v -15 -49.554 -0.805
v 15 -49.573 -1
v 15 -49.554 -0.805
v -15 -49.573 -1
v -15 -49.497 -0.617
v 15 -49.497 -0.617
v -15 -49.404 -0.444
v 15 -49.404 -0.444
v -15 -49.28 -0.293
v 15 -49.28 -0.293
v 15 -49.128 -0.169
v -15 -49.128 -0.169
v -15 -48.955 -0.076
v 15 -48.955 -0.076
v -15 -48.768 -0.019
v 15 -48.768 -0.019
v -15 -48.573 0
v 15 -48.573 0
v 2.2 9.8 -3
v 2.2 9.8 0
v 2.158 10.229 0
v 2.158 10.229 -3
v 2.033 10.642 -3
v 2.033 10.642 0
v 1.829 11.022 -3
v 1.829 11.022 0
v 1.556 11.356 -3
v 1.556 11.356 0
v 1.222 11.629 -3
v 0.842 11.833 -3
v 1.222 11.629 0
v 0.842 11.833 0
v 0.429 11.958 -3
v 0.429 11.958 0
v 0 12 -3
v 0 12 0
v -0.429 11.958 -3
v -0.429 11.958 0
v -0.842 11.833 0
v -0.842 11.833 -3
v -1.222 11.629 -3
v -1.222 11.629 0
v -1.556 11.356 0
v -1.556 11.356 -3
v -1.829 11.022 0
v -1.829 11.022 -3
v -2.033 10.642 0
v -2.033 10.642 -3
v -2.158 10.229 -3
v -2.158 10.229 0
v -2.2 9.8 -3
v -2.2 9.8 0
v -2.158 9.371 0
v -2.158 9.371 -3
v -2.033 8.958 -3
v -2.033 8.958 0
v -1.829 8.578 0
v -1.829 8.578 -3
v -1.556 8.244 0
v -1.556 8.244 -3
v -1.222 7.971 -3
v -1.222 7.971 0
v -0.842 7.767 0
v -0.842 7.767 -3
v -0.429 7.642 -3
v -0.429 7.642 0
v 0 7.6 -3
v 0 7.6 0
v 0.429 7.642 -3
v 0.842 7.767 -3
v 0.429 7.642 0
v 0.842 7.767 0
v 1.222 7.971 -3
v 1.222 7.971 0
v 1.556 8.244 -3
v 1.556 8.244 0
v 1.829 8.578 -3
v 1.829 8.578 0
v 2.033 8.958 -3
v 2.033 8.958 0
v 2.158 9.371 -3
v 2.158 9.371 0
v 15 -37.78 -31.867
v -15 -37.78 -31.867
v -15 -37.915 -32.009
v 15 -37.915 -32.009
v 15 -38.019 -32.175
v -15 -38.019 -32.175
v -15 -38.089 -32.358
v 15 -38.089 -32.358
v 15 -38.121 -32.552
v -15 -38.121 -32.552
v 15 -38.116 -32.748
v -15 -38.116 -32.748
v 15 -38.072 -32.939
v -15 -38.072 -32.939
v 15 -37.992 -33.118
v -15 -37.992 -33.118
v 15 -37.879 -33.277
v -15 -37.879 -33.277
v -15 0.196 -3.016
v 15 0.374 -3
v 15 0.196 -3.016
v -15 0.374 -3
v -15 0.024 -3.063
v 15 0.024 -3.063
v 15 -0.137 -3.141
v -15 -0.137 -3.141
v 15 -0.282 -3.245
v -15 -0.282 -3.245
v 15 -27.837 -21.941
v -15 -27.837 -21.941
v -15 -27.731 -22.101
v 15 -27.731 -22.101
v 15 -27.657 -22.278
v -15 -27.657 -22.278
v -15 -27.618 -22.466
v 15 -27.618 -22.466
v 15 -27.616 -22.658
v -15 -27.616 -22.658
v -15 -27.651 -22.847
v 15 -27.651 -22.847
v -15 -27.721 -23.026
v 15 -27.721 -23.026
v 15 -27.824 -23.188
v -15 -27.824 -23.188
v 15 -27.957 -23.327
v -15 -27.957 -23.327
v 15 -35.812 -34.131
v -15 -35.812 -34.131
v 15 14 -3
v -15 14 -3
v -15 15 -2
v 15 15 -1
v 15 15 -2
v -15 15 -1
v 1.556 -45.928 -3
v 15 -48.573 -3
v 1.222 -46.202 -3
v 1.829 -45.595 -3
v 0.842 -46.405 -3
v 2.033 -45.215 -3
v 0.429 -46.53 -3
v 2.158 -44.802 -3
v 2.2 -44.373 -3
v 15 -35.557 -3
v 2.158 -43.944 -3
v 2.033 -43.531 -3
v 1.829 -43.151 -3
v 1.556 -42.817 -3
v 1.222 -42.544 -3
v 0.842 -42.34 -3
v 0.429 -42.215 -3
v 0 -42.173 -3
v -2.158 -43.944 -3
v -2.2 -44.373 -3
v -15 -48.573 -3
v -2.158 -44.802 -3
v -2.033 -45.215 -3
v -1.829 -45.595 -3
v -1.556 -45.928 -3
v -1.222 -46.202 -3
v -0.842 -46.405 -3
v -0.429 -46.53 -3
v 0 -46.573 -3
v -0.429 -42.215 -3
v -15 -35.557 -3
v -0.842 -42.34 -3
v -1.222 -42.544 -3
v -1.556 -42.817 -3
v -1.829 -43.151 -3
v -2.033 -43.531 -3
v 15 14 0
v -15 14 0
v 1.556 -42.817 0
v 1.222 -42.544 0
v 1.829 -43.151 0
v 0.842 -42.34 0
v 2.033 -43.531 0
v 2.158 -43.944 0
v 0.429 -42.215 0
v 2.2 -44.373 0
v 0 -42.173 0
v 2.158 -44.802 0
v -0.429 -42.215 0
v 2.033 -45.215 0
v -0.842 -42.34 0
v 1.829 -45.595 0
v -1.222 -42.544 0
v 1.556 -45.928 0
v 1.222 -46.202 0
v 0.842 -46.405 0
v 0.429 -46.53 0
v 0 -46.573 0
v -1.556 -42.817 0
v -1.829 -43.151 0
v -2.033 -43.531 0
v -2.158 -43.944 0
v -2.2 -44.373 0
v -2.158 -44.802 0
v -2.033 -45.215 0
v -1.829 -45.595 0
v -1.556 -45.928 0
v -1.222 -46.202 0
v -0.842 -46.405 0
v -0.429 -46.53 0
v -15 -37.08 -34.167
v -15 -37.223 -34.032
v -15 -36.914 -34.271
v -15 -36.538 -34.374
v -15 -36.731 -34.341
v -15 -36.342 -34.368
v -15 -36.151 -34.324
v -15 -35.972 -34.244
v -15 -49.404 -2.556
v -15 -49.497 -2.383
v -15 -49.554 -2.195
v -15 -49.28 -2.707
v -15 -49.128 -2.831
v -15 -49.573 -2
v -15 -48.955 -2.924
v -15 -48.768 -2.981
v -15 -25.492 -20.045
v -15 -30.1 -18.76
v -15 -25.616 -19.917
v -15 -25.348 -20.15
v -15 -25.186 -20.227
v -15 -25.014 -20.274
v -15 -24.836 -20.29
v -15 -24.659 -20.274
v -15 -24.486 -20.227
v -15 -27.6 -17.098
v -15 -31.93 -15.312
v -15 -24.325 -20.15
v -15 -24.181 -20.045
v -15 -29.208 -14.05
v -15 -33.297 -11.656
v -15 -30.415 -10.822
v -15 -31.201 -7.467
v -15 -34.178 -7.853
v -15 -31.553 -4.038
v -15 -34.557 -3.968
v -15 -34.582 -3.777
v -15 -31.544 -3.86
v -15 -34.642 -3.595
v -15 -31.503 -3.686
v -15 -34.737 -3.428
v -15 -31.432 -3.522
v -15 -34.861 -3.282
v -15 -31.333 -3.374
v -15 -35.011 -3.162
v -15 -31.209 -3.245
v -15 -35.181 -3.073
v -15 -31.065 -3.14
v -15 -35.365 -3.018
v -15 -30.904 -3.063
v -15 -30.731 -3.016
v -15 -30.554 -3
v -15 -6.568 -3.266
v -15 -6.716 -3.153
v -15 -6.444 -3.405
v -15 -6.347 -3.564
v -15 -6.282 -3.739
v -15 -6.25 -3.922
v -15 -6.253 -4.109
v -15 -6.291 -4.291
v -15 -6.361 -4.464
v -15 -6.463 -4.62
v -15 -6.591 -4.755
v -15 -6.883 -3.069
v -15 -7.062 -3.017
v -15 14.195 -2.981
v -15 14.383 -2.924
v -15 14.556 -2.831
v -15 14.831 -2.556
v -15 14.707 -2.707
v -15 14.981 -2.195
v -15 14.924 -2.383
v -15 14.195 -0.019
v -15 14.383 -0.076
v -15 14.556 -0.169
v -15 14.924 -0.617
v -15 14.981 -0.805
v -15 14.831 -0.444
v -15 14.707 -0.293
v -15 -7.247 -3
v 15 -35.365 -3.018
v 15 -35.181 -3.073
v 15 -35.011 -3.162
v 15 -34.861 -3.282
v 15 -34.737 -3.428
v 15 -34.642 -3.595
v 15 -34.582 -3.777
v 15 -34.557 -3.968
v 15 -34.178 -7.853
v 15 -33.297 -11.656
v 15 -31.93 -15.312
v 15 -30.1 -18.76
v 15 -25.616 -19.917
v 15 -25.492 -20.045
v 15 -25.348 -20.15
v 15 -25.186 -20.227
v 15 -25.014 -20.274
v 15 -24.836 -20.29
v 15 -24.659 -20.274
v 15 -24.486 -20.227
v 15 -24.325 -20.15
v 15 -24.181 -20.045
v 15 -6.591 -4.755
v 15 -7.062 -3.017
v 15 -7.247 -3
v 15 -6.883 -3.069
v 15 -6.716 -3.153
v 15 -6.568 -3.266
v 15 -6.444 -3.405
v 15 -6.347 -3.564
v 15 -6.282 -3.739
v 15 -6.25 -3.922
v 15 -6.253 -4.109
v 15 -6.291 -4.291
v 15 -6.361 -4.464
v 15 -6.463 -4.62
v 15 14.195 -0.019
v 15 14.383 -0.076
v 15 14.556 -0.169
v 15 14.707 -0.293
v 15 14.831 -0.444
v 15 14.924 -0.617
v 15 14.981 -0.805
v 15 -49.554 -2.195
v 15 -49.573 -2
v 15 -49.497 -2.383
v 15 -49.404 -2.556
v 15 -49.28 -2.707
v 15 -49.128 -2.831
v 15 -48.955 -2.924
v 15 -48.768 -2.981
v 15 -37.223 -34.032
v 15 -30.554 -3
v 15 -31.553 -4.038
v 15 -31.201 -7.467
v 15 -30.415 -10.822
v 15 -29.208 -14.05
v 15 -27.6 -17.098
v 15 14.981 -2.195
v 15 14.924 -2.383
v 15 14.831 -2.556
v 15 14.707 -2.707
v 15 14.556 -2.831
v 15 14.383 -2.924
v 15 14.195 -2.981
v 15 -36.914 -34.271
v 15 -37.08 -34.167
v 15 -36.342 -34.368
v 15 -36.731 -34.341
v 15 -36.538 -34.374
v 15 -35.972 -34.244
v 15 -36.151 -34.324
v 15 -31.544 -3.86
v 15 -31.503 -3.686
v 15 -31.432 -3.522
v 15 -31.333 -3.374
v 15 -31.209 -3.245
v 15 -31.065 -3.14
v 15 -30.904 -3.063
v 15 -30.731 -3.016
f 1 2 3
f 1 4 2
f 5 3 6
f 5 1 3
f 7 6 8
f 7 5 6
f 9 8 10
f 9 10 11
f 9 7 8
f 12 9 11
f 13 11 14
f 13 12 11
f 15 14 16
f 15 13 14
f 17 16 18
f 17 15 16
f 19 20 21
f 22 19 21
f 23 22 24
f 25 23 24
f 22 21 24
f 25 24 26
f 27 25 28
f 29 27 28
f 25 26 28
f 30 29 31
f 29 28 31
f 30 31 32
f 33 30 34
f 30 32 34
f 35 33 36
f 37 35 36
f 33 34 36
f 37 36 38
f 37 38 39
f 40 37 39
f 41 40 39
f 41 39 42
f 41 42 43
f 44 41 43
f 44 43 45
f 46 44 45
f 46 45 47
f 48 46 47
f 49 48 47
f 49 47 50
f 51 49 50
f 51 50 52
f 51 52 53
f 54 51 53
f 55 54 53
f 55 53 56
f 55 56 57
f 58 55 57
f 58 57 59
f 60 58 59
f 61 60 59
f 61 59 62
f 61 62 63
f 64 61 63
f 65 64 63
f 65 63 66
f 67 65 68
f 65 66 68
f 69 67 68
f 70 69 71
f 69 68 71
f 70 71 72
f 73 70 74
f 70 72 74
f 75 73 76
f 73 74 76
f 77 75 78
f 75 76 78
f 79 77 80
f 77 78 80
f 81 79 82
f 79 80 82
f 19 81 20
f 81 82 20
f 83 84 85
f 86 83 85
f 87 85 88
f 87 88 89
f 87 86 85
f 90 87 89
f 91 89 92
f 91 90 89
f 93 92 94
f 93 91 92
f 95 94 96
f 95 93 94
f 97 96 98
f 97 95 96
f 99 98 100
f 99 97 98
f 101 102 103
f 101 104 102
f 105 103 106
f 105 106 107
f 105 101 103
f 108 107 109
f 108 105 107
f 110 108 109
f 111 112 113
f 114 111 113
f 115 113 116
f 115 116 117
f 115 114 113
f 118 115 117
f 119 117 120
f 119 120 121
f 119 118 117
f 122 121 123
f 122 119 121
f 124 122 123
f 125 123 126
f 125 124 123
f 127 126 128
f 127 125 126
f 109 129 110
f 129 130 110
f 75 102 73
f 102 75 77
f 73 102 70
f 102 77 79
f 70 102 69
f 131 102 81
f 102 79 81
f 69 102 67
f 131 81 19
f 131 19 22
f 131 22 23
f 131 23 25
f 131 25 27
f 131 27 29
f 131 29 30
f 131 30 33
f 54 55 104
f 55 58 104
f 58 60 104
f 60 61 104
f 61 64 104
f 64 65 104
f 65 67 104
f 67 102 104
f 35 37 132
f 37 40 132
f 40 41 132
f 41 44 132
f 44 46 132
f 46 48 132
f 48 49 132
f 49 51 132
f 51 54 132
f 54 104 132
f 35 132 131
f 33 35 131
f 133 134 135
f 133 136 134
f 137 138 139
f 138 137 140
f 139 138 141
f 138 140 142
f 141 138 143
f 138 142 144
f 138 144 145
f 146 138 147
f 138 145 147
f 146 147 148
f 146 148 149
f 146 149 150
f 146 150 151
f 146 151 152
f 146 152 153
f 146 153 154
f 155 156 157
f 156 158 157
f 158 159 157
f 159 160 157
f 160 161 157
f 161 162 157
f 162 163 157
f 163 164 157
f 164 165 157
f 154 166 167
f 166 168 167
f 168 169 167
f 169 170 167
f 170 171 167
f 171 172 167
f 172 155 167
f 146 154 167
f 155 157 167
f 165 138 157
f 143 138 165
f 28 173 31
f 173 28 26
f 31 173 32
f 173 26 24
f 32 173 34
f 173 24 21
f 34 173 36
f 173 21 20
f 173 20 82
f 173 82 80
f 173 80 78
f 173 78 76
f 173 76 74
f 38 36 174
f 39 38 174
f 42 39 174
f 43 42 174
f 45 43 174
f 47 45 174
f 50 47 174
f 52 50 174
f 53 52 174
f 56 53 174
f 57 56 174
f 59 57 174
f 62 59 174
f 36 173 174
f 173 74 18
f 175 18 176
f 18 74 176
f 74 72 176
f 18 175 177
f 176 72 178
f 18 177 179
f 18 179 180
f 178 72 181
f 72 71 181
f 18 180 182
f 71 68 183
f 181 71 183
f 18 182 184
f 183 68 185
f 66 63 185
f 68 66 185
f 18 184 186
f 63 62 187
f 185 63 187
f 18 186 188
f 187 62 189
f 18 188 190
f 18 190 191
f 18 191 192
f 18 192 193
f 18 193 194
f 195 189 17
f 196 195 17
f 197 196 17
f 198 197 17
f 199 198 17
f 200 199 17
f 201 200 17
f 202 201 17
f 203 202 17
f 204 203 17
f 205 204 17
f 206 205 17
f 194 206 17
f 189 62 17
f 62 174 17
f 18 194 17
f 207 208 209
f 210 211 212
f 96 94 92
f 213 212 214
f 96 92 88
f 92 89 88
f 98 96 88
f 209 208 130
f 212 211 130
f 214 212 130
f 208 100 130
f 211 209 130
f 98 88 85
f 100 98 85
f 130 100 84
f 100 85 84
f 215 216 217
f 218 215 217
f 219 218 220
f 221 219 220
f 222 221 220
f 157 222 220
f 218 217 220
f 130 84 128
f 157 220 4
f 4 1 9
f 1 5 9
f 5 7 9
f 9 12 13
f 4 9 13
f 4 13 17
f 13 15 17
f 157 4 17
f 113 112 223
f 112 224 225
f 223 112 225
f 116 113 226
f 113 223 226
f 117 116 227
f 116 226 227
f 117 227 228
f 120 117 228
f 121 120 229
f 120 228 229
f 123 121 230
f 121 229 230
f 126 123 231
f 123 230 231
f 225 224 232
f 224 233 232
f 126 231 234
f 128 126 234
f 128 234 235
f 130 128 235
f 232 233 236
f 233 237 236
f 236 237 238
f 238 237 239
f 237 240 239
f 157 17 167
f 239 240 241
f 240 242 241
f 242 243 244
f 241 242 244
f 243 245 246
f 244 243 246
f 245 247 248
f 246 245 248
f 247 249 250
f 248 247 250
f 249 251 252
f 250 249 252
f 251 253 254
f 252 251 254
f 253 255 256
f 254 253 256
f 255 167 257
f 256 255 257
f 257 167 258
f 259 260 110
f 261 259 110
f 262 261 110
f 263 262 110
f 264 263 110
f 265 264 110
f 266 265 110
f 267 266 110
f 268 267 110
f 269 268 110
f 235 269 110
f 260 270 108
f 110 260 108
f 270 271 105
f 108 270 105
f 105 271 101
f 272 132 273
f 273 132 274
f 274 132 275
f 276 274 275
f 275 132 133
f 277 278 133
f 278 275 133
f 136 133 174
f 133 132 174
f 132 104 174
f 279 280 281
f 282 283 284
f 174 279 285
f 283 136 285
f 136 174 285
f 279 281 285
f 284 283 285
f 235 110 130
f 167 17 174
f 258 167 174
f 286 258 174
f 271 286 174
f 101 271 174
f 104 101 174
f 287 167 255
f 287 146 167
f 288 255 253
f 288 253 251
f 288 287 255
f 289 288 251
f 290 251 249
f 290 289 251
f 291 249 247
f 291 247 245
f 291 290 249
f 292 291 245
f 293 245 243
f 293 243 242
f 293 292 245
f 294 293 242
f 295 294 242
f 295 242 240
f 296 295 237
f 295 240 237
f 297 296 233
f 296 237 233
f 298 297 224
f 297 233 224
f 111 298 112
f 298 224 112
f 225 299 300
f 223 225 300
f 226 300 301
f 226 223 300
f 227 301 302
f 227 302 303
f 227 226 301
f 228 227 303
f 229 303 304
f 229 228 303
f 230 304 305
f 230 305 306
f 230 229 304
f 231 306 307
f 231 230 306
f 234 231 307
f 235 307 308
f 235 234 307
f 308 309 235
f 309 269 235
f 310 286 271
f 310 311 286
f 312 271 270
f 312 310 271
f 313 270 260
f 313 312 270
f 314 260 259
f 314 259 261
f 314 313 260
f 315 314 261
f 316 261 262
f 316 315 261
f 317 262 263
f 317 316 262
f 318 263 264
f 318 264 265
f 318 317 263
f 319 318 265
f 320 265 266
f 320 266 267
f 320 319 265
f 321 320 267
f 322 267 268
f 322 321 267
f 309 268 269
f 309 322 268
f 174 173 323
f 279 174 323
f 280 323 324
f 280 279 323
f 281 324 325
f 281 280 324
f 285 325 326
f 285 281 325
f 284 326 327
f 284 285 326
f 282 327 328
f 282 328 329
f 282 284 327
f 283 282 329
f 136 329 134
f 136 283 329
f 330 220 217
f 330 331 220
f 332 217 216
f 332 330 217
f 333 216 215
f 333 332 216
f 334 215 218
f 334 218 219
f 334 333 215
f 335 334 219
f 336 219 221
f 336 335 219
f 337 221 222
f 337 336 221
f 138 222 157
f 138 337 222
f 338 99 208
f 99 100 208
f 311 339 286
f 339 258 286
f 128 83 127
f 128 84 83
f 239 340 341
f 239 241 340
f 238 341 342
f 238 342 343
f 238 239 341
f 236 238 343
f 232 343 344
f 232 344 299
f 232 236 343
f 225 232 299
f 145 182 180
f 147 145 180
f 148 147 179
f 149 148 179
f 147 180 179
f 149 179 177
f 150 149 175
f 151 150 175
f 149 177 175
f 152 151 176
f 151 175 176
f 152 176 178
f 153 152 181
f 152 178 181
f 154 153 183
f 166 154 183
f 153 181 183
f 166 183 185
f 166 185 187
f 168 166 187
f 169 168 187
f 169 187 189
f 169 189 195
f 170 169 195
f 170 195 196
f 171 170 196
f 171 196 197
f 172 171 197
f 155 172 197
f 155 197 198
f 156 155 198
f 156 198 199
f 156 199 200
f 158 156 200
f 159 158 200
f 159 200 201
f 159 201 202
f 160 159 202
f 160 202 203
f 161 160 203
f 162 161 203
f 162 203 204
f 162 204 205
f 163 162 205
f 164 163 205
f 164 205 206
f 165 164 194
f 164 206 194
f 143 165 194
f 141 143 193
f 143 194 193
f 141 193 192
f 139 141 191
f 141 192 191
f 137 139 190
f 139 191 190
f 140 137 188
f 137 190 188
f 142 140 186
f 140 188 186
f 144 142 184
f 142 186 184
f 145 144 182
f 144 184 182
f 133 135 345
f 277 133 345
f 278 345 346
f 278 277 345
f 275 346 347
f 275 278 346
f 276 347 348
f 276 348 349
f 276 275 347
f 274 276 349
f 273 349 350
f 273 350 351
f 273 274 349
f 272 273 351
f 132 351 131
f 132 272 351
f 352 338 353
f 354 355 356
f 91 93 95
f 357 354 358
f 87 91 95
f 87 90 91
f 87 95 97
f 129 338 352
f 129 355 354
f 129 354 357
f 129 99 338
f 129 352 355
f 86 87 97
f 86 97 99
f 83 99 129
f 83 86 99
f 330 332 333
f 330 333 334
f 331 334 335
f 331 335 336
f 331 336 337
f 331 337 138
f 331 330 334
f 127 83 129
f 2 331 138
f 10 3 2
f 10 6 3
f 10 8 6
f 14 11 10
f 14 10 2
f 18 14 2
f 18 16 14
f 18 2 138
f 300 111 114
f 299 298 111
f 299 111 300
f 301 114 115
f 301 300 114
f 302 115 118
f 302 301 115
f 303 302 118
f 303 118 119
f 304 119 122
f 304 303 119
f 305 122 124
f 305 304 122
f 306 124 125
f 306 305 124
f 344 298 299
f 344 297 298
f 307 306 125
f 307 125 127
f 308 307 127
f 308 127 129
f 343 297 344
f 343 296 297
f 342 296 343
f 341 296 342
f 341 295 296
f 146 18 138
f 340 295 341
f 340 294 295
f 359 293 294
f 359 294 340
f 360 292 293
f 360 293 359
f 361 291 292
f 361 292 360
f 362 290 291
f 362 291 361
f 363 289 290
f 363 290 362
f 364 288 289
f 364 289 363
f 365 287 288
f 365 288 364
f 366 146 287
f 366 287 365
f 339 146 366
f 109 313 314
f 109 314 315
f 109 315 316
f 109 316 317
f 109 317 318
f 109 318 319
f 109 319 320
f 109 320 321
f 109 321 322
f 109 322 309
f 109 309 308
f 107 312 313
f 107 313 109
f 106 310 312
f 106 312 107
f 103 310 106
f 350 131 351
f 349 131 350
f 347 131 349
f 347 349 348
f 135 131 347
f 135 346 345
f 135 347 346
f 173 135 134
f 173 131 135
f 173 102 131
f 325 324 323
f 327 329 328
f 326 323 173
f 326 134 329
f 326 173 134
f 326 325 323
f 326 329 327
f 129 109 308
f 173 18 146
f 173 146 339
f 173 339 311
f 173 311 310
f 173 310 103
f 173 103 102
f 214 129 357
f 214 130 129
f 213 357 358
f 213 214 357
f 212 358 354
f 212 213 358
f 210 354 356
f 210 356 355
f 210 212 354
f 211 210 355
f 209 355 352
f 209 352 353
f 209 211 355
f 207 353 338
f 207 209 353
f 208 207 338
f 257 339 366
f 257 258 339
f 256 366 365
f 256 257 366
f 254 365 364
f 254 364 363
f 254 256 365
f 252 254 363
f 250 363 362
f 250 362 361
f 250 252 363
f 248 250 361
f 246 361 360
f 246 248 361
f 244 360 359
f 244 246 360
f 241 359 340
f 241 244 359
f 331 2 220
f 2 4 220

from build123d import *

# Parameters (mm, degrees)
PAD010_DEPTH      = 15
PAD010_DEPTH_BACK = 15
SKETCH020_R       = 2.2
POCKET004_DEPTH   = 5
FILLET009_R       = 1


with BuildPart() as part:
    # Sketch019 → Pad010 (new body, two sides)
    with BuildSketch(Plane.YZ) as pad010_sk:
        with BuildLine():
            Line((-49.572759, 0), (-49.572759, -3))
            Line((-49.572759, -3), (-34.572759, -3))
            ThreePointArc((-34.572759, -3), (-32.672925, -13.506221), (-27.214047, -22.681771))
            Line((-38.53469, -32.522656), (-27.214047, -22.681771))
            Line((-38.53469, -32.522656), (-36.566513, -34.786785))
            Line((-36.566513, -34.786785), (0, -3))
            Line((0, -3), (15, -3))
            Line((15, 0), (15, -3))
            Line((15, 0), (-49.572759, 0))
        make_face()
        with BuildLine():
            Line((-4.572759, -3), (-24.949918, -20.713594))
            ThreePointArc((-31.572759, -3), (-29.862908, -12.455599), (-24.949918, -20.713594))
            Line((-31.572759, -3), (-4.572759, -3))
        make_face(mode=Mode.SUBTRACT)
    extrude(amount=-PAD010_DEPTH)
    extrude(pad010_sk.sketch, amount=PAD010_DEPTH_BACK)

    # Sketch020 → Pocket004 (cut)
    with BuildSketch(Plane.XY):
        with Locations((0, 9.8)):
            Circle(SKETCH020_R)
        with Locations((0, -44.372759)):
            Circle(SKETCH020_R)
    extrude(amount=-POCKET004_DEPTH, mode=Mode.SUBTRACT)

    # Fillet009
    fillet009_edges = [part.edges().sort_by_distance(p)[0] for p in [
        (0, -49.572759, 0),
        (0, -49.572759, -3),
        (0, -34.572759, -3),
        (0, -27.214047, -22.681771),
        (0, -38.53469, -32.522656),
        (0, -36.566513, -34.786785),
        (0, -31.572759, -3),
        (0, -4.572759, -3),
        (0, -24.949918, -20.713594),
        (0, 15, 0),
        (0, 15, -3),
        (0, 0, -3),
    ]]
    fillet(fillet009_edges, radius=FILLET009_R)


solid = part.part
